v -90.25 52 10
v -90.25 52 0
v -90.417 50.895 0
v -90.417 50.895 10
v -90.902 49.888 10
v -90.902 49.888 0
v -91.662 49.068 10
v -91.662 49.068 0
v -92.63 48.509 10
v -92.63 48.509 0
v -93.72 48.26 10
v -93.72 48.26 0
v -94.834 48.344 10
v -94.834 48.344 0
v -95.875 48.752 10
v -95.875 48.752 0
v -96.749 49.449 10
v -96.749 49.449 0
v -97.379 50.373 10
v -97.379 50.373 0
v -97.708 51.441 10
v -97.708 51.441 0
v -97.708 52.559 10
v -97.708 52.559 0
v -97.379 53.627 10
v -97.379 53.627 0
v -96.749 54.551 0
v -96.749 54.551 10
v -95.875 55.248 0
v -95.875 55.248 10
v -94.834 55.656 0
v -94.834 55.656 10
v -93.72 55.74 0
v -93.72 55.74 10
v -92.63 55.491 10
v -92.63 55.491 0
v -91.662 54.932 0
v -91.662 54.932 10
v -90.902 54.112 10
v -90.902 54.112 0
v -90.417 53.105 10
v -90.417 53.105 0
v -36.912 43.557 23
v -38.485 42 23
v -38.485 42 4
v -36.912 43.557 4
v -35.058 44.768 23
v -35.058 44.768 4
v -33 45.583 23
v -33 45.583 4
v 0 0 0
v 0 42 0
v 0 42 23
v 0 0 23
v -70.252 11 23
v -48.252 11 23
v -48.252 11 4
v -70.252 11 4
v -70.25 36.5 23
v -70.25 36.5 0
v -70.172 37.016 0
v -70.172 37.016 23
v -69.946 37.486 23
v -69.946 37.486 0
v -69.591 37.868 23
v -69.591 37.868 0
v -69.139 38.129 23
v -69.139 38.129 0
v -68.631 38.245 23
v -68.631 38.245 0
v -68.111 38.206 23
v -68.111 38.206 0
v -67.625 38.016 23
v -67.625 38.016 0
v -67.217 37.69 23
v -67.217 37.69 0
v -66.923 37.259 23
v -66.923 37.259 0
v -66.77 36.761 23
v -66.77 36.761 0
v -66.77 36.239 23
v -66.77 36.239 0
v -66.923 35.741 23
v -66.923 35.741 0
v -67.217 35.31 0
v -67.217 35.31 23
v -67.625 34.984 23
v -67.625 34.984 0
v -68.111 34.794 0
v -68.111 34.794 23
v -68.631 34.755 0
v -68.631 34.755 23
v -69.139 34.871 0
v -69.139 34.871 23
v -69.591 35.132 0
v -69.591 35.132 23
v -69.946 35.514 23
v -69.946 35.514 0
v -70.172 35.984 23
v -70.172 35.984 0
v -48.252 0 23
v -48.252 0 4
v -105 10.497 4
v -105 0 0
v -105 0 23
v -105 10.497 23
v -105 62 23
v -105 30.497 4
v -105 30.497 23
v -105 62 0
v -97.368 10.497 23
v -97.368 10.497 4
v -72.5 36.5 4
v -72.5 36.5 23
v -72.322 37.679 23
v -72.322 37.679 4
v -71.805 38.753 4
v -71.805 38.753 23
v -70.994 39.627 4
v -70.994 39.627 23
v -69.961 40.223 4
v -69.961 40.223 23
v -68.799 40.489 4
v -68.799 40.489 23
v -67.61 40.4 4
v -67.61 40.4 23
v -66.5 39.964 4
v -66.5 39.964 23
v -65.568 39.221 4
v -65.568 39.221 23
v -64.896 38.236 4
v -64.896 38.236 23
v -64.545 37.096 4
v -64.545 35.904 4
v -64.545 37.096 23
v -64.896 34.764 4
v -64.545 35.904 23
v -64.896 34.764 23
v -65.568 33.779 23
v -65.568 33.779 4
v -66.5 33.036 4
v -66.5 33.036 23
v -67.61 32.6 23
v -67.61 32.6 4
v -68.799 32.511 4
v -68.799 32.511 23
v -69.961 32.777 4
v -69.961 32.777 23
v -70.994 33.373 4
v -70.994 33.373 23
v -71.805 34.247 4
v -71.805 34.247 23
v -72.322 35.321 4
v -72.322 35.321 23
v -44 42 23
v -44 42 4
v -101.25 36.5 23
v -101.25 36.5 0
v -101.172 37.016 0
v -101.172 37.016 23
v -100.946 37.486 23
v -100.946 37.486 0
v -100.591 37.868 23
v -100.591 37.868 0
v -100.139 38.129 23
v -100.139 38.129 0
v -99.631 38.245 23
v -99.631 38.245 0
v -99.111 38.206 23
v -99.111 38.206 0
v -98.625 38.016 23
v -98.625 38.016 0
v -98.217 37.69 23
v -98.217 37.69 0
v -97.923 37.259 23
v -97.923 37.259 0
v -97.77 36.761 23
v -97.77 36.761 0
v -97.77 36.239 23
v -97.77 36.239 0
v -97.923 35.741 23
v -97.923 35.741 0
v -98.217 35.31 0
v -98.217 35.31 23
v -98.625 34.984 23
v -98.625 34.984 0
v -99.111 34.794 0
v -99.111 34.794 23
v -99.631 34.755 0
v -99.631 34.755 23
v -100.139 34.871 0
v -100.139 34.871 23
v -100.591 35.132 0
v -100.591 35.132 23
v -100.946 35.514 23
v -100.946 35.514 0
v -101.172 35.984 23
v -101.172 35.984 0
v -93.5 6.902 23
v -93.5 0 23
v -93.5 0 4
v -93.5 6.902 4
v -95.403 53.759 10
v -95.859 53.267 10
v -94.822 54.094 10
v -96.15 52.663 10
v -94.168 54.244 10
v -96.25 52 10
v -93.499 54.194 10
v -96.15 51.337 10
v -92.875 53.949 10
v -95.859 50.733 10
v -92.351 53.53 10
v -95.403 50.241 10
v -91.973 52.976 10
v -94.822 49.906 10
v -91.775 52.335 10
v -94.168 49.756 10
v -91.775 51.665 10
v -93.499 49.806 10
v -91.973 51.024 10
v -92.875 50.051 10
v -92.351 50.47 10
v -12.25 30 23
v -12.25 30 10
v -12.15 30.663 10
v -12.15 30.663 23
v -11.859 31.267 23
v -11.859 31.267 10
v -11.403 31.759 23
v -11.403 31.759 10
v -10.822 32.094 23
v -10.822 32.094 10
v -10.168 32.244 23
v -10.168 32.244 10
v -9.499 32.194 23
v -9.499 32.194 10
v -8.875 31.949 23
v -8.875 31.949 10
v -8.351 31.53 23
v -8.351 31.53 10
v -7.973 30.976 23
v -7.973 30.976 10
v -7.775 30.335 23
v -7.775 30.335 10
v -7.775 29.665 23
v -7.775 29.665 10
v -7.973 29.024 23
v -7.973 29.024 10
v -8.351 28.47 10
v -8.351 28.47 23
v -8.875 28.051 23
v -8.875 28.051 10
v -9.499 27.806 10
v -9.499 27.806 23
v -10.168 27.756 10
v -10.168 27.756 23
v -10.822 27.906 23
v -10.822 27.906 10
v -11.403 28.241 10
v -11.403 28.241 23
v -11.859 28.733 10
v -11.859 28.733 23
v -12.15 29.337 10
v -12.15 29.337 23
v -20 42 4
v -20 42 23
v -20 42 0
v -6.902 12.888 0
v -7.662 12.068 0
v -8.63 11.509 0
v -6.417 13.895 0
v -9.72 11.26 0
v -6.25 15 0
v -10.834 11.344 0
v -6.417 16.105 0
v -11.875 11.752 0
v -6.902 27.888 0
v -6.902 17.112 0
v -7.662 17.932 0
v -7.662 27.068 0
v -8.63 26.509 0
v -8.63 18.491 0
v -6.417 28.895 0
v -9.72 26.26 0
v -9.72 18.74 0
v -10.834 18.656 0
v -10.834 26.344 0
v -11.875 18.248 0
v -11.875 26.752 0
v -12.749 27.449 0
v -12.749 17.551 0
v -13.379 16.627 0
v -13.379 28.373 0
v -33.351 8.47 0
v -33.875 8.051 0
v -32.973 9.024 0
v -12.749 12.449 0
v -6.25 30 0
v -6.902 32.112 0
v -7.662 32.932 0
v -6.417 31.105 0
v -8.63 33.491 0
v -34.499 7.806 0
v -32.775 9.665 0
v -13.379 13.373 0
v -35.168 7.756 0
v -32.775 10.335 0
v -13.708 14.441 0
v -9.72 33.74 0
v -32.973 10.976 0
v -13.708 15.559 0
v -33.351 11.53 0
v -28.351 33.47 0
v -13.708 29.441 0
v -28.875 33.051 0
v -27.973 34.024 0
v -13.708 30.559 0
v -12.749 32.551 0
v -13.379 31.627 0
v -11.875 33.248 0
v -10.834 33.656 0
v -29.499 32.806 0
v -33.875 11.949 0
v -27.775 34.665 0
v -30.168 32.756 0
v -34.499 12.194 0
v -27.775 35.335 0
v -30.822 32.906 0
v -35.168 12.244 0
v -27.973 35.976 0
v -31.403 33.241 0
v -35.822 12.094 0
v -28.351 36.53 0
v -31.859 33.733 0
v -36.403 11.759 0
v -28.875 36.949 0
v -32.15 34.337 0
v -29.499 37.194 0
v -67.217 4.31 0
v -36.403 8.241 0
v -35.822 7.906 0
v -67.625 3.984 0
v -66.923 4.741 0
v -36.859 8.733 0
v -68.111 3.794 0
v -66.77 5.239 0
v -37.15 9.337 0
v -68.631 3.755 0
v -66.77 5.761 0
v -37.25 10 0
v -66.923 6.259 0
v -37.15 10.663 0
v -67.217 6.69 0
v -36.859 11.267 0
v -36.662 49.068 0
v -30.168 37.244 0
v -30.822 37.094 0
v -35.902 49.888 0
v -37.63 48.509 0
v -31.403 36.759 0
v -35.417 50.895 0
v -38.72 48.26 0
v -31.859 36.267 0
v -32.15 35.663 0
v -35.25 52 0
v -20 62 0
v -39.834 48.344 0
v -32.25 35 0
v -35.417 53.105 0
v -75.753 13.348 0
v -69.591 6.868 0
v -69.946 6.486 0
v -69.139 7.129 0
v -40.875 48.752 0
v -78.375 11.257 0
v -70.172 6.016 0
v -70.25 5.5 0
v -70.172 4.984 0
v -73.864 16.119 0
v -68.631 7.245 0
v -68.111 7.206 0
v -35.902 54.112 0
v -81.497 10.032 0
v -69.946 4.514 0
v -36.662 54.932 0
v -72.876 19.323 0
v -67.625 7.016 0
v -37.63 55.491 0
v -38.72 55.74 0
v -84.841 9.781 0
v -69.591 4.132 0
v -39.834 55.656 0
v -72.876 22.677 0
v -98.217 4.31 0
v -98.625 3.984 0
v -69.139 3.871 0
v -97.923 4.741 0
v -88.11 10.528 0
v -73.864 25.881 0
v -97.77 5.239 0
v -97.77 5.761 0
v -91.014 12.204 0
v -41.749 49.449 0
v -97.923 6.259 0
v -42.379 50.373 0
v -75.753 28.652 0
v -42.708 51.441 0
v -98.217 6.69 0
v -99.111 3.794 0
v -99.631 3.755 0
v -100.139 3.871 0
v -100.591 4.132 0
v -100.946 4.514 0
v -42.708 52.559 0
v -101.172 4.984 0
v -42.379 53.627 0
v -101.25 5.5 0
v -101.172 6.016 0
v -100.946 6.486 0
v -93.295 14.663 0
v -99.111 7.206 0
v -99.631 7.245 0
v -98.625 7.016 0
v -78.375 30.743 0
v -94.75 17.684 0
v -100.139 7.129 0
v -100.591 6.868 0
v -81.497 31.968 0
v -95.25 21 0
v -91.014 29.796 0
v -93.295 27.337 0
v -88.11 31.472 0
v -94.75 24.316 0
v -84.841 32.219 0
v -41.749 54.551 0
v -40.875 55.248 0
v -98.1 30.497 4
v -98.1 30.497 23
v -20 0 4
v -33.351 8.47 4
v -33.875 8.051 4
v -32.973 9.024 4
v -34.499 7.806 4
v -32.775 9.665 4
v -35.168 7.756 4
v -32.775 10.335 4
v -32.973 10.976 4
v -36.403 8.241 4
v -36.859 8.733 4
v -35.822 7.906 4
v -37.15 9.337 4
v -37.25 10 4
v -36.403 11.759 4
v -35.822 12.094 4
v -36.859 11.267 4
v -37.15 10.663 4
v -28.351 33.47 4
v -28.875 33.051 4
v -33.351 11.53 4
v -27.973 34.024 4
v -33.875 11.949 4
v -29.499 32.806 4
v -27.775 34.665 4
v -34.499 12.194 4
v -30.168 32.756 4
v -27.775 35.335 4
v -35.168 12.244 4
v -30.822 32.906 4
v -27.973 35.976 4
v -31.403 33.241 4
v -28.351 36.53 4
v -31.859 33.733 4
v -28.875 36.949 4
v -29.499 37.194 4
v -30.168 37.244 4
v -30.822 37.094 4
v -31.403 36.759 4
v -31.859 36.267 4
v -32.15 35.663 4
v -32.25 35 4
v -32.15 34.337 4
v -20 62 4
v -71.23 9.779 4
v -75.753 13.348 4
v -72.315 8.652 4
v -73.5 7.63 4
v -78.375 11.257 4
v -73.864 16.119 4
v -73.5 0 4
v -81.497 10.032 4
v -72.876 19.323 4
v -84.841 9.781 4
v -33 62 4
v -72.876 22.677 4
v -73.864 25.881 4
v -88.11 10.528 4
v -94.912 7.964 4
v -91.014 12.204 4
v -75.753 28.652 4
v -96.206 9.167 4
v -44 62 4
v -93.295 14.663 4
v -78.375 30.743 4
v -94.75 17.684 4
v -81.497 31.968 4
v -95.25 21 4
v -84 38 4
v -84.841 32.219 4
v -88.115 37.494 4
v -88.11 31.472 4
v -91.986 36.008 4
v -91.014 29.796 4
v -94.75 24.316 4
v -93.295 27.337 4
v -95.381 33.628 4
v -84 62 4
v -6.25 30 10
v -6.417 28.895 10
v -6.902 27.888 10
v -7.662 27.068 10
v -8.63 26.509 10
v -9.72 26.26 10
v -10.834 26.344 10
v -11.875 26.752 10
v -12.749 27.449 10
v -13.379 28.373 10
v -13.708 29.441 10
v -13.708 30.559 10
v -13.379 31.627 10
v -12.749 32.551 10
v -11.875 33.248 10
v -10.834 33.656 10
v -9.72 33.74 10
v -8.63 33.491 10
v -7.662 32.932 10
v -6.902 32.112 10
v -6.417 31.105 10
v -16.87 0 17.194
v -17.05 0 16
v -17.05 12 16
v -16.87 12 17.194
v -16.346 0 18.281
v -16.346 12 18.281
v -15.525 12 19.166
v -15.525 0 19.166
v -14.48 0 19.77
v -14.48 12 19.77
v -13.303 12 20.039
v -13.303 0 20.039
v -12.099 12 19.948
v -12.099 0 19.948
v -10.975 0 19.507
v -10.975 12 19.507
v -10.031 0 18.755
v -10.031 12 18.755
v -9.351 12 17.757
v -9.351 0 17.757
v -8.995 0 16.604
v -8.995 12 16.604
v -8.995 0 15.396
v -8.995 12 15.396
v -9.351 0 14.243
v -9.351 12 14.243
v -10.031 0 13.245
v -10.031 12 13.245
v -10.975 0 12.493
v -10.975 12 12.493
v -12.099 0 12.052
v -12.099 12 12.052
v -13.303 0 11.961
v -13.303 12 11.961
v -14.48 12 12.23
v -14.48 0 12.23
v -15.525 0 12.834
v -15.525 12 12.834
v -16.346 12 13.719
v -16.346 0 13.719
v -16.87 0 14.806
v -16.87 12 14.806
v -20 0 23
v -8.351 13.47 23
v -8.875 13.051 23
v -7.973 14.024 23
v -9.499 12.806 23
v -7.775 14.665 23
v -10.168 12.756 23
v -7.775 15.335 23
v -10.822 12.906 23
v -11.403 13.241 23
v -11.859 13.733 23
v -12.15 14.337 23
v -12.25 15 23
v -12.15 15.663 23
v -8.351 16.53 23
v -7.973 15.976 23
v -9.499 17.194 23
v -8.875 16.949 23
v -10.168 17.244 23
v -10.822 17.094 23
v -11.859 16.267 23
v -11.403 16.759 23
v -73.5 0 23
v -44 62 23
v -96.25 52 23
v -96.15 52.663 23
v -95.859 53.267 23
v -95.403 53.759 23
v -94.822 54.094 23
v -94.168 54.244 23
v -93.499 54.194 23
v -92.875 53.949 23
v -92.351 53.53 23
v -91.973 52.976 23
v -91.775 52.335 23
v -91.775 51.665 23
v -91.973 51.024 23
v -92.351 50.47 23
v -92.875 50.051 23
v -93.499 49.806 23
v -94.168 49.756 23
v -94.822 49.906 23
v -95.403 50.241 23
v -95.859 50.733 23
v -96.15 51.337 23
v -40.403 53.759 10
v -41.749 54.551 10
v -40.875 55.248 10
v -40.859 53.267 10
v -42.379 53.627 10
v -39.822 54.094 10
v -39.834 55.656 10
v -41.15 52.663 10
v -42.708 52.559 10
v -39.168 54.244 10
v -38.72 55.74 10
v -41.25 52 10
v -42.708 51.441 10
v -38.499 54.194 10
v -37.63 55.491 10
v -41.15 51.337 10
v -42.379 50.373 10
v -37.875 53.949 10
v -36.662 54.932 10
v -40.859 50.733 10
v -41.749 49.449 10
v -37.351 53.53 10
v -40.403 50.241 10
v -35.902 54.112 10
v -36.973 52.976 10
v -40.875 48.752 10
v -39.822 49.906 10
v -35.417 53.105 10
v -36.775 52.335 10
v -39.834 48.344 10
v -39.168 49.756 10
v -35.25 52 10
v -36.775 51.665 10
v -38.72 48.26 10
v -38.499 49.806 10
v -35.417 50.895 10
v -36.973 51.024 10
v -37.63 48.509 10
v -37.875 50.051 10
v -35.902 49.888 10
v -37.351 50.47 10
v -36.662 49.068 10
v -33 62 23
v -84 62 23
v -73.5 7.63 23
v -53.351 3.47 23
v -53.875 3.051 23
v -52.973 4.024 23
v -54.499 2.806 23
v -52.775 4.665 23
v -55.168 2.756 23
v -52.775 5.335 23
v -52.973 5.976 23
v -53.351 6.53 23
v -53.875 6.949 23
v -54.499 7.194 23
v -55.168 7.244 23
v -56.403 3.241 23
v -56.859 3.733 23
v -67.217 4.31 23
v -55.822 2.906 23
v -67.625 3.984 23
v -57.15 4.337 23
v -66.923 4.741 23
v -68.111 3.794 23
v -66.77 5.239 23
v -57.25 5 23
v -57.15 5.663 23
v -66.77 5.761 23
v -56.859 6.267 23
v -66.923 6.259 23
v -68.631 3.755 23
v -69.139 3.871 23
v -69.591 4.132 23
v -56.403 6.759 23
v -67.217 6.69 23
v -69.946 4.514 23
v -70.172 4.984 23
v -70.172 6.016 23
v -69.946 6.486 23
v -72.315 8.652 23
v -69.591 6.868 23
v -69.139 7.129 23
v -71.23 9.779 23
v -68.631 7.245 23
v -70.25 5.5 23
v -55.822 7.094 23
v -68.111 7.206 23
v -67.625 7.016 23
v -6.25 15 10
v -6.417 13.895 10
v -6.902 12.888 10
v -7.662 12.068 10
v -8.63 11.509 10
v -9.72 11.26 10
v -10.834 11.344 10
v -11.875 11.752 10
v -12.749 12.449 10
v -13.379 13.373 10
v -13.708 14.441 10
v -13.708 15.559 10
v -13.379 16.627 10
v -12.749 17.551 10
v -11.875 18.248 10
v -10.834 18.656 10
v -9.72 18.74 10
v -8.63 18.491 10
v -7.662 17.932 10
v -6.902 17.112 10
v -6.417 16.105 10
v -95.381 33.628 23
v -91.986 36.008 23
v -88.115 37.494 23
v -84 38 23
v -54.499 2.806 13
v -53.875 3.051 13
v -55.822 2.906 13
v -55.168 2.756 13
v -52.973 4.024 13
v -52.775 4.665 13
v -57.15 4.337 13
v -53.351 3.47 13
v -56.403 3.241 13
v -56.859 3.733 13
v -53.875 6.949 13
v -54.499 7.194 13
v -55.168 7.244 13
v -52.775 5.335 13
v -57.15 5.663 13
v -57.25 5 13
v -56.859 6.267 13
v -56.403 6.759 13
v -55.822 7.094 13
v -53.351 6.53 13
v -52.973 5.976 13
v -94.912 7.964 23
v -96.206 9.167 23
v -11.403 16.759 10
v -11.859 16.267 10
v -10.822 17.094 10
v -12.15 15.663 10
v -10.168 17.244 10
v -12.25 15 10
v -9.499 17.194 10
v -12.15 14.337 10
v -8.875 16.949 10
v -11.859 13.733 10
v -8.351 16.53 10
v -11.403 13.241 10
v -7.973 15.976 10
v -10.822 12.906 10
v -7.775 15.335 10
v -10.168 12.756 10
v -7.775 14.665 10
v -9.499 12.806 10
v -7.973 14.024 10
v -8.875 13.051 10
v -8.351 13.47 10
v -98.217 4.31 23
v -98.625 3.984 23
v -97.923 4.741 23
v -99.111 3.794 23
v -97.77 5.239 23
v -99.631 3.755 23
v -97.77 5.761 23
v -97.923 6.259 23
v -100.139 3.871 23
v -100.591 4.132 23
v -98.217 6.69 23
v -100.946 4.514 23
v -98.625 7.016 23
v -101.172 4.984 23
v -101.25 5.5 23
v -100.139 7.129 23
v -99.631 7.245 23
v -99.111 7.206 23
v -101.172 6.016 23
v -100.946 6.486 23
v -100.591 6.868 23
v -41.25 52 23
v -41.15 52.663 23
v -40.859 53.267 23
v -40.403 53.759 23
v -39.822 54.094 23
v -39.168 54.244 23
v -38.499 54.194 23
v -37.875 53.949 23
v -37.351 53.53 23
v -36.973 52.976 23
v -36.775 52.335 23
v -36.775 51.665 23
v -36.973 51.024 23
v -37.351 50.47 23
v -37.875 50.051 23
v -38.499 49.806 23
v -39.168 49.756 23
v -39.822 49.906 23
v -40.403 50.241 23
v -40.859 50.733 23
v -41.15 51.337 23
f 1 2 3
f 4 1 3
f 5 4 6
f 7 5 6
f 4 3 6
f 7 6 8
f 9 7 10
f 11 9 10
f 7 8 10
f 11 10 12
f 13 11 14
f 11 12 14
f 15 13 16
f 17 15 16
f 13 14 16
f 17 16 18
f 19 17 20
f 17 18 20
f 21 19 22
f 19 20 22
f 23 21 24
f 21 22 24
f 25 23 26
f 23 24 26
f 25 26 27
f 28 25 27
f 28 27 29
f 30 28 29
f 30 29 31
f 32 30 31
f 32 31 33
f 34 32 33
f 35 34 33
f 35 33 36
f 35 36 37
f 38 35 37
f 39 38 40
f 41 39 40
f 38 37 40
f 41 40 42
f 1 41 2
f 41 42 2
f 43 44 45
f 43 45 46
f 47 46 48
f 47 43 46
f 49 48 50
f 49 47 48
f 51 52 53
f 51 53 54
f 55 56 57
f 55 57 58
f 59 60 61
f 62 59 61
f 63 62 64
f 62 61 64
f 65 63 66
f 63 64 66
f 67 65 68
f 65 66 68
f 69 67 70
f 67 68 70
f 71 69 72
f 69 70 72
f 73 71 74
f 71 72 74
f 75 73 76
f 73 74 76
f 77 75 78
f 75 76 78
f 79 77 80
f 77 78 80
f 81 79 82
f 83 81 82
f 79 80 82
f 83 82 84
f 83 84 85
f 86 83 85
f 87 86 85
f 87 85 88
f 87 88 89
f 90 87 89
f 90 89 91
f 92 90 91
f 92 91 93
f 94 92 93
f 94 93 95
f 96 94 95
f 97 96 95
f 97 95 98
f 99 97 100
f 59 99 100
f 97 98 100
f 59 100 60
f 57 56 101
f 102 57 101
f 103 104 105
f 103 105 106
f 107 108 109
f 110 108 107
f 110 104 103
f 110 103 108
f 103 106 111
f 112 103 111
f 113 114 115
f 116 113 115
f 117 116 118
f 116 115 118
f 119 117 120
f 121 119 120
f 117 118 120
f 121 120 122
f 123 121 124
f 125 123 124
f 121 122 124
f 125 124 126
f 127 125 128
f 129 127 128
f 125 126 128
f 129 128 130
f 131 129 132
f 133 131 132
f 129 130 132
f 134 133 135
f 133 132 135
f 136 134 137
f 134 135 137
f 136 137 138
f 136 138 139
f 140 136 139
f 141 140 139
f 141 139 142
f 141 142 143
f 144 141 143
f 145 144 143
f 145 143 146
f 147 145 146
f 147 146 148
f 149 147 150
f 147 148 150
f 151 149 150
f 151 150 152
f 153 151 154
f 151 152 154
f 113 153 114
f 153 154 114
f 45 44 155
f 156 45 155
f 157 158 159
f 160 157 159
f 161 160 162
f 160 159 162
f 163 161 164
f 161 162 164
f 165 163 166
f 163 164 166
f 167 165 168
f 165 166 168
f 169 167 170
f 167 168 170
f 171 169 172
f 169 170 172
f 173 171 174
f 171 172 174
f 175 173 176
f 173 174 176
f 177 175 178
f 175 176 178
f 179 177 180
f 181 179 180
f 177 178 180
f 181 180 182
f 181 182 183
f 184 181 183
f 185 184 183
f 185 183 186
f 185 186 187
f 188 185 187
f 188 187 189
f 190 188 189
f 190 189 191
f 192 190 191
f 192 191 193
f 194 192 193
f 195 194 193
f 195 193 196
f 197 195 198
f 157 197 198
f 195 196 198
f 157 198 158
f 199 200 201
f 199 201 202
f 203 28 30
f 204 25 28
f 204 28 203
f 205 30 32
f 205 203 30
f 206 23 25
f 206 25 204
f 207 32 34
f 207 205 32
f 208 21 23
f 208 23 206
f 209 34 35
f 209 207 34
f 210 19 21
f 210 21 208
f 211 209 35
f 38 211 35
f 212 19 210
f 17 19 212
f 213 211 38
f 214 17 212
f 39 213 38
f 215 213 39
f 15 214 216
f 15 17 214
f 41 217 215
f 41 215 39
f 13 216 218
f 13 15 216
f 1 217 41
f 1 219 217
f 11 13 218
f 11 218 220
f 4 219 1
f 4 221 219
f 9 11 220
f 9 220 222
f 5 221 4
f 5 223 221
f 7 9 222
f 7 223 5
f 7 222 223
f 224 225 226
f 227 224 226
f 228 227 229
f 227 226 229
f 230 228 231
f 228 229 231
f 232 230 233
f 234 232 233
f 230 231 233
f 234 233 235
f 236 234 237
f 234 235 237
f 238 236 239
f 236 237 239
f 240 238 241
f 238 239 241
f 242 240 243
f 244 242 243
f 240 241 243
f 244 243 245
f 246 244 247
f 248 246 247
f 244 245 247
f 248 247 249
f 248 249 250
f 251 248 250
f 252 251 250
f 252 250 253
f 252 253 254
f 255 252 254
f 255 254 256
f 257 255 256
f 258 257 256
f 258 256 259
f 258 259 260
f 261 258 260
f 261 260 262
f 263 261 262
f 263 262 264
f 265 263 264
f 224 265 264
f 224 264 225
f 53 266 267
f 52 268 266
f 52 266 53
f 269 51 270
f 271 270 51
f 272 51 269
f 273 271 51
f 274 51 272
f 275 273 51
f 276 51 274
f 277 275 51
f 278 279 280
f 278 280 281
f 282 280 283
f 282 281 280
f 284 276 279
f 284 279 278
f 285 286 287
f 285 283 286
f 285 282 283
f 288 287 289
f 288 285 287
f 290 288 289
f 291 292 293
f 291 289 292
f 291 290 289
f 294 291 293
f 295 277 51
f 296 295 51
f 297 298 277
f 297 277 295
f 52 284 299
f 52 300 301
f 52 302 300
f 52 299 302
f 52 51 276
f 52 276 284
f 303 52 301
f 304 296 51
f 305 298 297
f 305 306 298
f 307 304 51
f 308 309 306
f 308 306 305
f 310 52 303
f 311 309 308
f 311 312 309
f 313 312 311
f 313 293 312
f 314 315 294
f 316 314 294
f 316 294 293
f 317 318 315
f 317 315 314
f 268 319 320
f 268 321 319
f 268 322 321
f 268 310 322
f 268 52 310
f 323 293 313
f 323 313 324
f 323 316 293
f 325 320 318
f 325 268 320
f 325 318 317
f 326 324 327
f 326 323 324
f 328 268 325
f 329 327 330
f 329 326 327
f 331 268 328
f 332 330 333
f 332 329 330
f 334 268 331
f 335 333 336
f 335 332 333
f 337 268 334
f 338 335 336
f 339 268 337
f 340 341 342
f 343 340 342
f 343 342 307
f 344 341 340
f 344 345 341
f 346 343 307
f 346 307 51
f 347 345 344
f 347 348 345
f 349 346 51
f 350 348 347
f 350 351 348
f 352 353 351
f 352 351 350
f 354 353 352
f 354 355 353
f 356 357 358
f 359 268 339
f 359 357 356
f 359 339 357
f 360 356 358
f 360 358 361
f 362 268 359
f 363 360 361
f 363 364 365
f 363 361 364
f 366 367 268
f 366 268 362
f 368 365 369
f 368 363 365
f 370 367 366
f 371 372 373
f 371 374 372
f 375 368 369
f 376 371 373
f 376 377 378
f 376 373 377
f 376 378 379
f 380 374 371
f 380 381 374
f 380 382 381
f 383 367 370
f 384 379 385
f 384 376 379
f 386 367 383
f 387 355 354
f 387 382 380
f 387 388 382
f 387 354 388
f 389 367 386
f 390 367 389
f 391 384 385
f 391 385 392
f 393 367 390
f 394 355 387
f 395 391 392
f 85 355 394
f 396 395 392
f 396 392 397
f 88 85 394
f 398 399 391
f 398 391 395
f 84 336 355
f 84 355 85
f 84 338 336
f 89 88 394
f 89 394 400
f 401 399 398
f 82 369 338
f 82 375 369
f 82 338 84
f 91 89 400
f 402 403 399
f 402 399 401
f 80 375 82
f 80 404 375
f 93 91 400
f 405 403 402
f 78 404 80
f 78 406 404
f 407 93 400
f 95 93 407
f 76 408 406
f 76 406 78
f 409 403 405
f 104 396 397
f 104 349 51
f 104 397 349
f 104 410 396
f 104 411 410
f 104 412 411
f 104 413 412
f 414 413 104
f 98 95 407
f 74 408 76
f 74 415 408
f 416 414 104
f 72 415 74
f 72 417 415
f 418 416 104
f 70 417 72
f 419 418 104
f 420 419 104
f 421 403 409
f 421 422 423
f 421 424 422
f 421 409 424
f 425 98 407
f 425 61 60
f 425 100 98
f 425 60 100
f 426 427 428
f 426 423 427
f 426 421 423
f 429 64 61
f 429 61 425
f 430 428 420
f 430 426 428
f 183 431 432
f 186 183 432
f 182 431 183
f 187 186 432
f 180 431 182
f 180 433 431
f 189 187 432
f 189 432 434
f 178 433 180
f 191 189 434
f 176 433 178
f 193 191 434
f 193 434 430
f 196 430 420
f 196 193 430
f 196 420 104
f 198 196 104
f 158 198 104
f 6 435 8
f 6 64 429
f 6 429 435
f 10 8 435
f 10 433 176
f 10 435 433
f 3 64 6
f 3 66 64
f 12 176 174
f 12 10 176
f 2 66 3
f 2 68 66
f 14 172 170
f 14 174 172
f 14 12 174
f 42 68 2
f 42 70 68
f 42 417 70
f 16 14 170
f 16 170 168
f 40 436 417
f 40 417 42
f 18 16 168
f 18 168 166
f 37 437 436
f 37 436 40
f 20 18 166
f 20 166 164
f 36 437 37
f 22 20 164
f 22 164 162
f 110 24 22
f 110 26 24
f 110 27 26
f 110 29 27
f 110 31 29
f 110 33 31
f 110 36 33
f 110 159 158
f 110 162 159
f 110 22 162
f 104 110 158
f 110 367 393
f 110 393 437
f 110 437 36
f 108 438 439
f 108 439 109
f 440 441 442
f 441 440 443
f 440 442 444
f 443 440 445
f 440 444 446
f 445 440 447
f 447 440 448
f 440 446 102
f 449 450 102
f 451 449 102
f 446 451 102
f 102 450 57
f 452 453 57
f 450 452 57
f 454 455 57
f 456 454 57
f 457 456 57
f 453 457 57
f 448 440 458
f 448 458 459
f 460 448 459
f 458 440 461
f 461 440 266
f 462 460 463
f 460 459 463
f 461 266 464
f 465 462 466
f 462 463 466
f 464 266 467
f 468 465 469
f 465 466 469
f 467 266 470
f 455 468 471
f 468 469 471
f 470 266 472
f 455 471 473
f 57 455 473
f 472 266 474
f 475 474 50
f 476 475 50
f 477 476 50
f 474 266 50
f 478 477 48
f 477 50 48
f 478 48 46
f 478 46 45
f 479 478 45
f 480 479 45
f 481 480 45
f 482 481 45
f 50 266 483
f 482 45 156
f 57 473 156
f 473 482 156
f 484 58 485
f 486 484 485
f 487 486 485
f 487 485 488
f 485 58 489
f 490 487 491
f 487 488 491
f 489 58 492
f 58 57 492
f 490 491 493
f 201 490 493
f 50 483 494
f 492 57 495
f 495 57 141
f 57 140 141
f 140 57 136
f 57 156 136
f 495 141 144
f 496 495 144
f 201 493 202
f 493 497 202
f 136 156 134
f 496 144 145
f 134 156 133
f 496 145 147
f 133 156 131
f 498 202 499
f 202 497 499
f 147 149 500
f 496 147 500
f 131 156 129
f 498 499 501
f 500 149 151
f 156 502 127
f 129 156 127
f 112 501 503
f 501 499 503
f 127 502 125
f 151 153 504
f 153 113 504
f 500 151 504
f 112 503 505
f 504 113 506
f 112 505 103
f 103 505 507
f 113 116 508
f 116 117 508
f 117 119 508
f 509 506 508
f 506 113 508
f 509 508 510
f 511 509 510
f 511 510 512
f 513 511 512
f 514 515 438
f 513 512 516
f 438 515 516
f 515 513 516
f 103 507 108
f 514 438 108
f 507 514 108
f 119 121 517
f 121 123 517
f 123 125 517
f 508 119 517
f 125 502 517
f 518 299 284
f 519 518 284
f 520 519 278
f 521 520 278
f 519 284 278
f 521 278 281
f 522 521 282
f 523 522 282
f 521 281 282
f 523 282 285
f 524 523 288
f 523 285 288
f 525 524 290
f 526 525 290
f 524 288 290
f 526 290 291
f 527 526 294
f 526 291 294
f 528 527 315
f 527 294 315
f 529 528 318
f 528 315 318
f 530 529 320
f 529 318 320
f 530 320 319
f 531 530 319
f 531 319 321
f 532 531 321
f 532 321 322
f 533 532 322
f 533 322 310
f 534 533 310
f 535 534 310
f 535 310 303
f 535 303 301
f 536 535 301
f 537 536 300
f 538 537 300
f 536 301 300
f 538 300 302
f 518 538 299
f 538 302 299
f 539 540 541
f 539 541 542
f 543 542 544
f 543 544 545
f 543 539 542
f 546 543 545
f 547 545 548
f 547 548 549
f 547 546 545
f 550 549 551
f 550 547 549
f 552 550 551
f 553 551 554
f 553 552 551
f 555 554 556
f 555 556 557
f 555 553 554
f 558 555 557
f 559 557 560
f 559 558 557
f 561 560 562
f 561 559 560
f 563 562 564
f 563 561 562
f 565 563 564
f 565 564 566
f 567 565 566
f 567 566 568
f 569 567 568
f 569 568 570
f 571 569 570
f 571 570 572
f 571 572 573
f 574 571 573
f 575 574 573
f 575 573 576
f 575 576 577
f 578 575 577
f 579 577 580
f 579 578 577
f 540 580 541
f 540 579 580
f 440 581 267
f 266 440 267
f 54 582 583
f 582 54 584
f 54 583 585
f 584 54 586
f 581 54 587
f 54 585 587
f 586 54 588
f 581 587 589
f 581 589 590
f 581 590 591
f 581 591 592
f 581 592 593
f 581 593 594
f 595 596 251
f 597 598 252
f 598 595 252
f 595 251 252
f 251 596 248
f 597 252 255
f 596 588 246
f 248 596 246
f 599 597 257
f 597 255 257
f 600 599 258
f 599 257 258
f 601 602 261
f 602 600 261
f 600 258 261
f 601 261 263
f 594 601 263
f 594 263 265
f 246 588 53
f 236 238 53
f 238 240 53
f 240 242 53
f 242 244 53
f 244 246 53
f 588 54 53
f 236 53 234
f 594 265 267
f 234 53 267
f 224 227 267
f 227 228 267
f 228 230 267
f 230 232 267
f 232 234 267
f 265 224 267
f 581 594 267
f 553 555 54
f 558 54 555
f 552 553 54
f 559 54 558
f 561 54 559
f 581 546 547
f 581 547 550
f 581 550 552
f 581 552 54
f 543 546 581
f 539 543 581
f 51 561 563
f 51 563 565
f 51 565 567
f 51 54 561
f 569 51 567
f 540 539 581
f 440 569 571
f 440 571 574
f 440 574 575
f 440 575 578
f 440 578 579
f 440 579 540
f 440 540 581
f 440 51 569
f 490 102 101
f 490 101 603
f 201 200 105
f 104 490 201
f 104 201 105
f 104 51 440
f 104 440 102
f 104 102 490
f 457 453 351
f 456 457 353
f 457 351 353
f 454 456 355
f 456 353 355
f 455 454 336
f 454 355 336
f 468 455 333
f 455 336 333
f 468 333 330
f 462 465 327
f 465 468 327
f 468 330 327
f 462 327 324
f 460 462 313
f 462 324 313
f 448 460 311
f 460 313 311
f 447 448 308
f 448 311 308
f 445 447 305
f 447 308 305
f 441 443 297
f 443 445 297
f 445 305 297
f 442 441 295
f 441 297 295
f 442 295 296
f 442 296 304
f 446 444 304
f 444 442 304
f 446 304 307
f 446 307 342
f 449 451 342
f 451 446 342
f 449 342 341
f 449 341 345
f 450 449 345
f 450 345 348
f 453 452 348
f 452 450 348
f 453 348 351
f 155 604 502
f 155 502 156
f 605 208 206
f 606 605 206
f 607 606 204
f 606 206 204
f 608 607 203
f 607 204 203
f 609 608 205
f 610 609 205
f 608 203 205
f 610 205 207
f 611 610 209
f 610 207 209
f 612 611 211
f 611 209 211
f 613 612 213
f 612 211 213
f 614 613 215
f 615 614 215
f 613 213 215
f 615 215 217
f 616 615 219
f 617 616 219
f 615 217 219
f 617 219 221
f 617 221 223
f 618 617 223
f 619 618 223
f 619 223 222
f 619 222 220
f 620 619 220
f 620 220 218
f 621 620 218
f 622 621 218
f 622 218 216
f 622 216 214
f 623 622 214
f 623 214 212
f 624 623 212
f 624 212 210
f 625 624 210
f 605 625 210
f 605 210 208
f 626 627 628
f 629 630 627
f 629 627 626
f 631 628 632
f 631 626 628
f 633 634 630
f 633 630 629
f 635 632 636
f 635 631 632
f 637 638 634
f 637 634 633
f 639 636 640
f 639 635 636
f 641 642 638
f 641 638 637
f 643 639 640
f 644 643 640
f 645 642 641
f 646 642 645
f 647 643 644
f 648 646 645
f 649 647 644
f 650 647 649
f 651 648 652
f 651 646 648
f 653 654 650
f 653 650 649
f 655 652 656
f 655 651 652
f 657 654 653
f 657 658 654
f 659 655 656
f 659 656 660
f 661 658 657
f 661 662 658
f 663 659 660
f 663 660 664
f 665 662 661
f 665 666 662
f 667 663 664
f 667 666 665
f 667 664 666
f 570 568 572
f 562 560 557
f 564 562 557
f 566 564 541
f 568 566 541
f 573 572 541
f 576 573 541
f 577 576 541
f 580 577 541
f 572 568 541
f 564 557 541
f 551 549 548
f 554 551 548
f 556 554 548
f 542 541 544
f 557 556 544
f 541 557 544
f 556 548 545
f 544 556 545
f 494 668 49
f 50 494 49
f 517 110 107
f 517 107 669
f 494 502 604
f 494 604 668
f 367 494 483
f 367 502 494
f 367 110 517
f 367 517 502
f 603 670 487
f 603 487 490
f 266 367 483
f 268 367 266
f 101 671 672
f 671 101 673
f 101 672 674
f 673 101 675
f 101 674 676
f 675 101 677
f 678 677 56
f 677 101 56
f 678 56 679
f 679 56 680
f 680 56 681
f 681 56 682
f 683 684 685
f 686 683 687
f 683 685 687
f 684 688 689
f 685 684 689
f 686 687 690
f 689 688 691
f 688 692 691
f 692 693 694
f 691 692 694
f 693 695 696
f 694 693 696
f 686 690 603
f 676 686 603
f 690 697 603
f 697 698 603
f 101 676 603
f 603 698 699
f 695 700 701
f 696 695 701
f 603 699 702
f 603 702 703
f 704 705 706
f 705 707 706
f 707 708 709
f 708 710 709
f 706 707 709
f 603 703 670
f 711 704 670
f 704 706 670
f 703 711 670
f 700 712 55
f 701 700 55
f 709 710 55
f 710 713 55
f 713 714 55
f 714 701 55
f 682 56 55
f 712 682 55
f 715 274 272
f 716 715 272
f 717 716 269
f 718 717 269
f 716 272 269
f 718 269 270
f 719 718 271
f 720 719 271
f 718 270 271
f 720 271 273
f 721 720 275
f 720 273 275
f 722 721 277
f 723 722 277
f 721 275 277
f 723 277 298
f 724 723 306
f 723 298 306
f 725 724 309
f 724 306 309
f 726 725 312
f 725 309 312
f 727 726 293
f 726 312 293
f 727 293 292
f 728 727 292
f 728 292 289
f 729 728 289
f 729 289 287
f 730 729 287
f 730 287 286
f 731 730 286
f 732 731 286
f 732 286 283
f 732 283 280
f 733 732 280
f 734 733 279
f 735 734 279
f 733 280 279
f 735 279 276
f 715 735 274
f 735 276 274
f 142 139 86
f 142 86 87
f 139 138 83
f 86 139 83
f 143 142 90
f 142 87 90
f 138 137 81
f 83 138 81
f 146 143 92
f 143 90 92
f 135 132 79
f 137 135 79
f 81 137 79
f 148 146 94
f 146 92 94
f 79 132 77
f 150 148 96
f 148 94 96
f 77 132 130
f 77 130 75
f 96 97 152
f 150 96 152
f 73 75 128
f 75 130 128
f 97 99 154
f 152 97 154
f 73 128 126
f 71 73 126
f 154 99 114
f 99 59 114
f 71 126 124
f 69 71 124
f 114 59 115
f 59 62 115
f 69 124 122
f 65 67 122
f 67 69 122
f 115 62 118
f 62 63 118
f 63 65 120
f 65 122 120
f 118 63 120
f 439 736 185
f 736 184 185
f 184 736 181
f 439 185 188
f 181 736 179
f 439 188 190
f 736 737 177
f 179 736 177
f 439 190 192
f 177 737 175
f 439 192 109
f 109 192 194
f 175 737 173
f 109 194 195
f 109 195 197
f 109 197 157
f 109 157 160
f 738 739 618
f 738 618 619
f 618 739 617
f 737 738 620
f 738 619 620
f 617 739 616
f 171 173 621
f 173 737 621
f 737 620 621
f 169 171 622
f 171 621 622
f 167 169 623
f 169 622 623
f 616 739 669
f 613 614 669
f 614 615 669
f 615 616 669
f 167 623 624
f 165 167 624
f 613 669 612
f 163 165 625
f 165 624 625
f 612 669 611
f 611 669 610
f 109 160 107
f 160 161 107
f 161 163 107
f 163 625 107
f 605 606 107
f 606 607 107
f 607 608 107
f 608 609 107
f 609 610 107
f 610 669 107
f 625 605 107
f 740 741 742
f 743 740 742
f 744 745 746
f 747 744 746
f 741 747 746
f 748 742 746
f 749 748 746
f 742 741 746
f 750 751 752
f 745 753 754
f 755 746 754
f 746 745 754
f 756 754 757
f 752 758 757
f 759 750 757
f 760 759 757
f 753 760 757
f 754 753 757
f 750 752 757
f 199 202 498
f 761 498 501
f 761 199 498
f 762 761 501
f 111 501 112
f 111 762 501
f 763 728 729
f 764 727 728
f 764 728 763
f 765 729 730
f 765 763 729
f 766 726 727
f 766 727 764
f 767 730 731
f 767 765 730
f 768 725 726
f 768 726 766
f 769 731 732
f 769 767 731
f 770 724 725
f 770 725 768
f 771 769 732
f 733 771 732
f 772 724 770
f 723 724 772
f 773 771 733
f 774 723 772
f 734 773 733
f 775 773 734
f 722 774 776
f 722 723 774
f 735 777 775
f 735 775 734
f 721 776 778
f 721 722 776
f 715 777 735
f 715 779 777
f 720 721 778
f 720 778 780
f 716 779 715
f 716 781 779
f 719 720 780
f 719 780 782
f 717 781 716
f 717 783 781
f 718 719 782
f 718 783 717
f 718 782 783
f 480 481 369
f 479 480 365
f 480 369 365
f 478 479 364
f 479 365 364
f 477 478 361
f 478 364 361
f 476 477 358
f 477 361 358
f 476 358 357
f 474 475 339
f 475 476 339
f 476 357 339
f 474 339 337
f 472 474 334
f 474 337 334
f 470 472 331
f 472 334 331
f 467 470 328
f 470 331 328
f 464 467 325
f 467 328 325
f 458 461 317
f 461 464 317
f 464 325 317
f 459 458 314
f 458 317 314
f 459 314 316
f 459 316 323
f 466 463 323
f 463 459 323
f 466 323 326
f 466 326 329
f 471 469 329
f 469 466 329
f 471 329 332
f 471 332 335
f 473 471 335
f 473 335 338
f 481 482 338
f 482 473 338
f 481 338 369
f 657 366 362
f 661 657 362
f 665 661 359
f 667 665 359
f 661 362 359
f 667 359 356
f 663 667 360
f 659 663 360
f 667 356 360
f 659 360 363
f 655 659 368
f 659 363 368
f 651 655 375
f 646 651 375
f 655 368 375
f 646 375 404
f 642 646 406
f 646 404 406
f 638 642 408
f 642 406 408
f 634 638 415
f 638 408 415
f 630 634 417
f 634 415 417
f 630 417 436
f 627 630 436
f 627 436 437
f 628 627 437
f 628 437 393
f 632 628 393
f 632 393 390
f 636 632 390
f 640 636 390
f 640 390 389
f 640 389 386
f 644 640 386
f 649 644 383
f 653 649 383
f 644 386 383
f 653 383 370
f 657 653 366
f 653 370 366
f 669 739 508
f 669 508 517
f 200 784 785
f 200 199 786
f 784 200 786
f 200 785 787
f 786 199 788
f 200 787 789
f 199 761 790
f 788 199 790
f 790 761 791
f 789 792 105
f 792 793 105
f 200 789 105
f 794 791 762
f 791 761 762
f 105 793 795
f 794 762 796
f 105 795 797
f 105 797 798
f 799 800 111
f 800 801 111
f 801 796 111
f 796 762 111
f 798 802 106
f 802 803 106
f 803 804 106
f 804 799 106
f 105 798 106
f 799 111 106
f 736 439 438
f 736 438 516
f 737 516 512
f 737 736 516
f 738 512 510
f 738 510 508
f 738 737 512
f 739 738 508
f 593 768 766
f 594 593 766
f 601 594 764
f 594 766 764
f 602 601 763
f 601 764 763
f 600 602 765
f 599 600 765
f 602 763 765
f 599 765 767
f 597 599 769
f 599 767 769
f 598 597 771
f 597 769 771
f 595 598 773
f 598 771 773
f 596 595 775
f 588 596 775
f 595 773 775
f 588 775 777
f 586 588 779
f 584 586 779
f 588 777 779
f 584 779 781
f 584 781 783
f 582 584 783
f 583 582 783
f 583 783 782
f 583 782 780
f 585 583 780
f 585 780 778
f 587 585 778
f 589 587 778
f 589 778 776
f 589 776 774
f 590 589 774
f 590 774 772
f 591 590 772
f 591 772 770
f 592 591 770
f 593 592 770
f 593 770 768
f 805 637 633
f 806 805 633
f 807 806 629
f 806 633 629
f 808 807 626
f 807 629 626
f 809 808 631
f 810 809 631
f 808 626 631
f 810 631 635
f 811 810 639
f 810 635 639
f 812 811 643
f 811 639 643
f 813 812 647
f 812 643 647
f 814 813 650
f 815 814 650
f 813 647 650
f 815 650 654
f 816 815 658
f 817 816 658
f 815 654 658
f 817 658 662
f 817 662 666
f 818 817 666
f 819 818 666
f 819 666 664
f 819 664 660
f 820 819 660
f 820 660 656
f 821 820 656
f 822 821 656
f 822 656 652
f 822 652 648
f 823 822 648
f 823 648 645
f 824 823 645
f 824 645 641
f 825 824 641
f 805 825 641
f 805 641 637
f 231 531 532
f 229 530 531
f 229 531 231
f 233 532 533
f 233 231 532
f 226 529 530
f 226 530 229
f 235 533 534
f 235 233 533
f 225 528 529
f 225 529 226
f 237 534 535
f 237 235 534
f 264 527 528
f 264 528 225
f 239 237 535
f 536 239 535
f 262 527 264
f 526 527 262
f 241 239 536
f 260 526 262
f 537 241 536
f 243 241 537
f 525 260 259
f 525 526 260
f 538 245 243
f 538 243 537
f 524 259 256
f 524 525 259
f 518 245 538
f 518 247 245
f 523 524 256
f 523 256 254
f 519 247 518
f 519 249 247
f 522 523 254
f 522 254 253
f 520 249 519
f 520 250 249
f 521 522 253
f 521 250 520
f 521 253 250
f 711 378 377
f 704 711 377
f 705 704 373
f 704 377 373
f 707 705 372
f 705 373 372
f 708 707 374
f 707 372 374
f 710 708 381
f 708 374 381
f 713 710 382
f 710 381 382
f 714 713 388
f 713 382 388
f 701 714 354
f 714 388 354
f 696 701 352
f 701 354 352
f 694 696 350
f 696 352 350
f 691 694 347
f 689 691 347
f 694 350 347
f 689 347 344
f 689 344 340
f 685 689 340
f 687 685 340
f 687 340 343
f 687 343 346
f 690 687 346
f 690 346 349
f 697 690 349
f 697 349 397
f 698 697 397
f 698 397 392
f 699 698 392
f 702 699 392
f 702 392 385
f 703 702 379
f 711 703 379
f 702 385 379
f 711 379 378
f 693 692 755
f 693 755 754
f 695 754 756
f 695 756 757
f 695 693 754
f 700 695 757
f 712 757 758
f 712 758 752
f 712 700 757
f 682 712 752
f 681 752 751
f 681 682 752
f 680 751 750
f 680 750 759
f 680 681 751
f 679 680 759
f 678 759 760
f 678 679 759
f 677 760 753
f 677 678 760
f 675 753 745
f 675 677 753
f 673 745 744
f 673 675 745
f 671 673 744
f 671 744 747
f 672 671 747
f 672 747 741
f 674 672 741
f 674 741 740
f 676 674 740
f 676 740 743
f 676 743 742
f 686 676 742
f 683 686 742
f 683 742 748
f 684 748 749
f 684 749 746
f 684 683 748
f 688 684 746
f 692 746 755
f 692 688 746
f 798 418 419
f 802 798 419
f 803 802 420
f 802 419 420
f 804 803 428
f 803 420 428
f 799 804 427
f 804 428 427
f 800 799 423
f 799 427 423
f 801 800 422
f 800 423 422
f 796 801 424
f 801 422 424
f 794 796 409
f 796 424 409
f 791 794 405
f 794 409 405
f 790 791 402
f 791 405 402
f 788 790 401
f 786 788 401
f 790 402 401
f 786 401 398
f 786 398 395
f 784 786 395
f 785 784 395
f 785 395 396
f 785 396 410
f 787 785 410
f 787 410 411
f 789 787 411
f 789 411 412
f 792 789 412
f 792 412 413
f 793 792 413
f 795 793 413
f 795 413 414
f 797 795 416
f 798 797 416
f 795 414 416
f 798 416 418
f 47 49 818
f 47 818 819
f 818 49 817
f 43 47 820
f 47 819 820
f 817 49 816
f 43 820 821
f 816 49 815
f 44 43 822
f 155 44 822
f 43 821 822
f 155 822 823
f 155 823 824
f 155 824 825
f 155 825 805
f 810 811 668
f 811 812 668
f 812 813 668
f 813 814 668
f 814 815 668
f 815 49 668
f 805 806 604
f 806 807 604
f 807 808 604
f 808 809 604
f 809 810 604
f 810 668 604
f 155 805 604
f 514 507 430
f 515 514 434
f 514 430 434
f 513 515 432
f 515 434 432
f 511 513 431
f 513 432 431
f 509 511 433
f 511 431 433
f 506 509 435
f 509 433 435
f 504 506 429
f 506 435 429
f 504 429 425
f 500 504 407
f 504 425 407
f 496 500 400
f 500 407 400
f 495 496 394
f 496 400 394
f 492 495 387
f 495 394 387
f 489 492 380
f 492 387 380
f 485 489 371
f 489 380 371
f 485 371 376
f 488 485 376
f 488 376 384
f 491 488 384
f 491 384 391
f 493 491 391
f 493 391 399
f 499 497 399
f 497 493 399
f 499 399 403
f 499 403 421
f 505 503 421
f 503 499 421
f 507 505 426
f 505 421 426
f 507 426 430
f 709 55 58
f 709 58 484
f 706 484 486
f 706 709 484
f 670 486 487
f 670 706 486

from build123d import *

# Parameters (mm, degrees)
SKETCH_R        = 2.25
SKETCH_R_2      = 11.25
SKETCH_R_3      = 1.75
PAD_DEPTH       = 23
SKETCH001_R     = 4
POCKET_DEPTH    = 19
SKETCH002_R     = 2.25
POCKET001_DEPTH = 10
SKETCH003_R     = 4.05
POCKET002_DEPTH = 12
SKETCH004_R     = 3.75
POCKET003_DEPTH = 10


with BuildPart() as pocket002:
    # Sketch → Pad (new body)
    with BuildSketch(Plane.XY):
        Polygon((0, 0), (105, 0), (105, 62), (20, 62), (20, 42), (0, 42), align=None)
        with Locations((35, 10)):
            Circle(SKETCH_R, mode=Mode.SUBTRACT)
        with Locations((30, 35)):
            Circle(SKETCH_R, mode=Mode.SUBTRACT)
        with Locations((84, 21)):
            Circle(SKETCH_R_2, mode=Mode.SUBTRACT)
        with Locations((68.5, 36.5)):
            Circle(SKETCH_R_3, mode=Mode.SUBTRACT)
        with Locations((99.5, 36.5)):
            Circle(SKETCH_R_3, mode=Mode.SUBTRACT)
        with Locations((68.5, 5.5)):
            Circle(SKETCH_R_3, mode=Mode.SUBTRACT)
        with Locations((99.5, 5.5)):
            Circle(SKETCH_R_3, mode=Mode.SUBTRACT)
        with Locations((10, 30)):
            Circle(SKETCH_R, mode=Mode.SUBTRACT)
        with Locations((10, 15)):
            Circle(SKETCH_R, mode=Mode.SUBTRACT)
        with Locations((39, 52)):
            Circle(SKETCH_R, mode=Mode.SUBTRACT)
        with Locations((94, 52)):
            Circle(SKETCH_R, mode=Mode.SUBTRACT)
    extrude(amount=PAD_DEPTH)

    # Sketch001 → Pocket (cut)
    with BuildSketch(Plane.XY.offset(23)):
        with BuildLine():
            ThreePointArc((38.485281, 42), (36.015595, 44.209377), (32.999996, 45.583006))
            Line((32.999996, 67), (32.999996, 45.583006))
            Line((20, 67), (32.999996, 67))
            Line((20, -1), (20, 67))
            Line((20, -1), (48.252269, -1))
            Line((48.252269, 11), (48.252269, -1))
            Line((48.252269, 11), (70.252269, 11))
            ThreePointArc((70.252269, 11), (71.759618, 9.202833), (73.499996, 7.630258))
            Line((73.499996, 7.630258), (73.499996, -1))
            Line((73.499996, -1), (93.499996, -1))
            Line((93.499996, -1), (93.499996, 6.902128))
            ThreePointArc((93.499996, 6.902128), (95.574295, 8.548671), (97.367695, 10.497399))
            Line((105.499996, 10.497399), (97.367695, 10.497399))
            Line((105.499996, 30.497399), (105.499996, 10.497399))
            Line((98.099621, 30.497399), (105.499996, 30.497399))
            ThreePointArc((98.099621, 30.497399), (91.98574, 36.007594), (83.999996, 38))
            Line((83.999996, 38), (83.999996, 67))
            Line((83.999996, 67), (43.999996, 67))
            Line((43.999996, 67), (43.999996, 42))
            Line((38.485281, 42), (43.999996, 42))
        make_face()
        with Locations((68.5, 36.5)):
            Circle(SKETCH001_R, mode=Mode.SUBTRACT)
    extrude(amount=-POCKET_DEPTH, mode=Mode.SUBTRACT)

    # Sketch002 → Pocket001 (cut)
    with BuildSketch(Plane.XY.offset(23)):
        with Locations((55, 5)):
            Circle(SKETCH002_R)
    extrude(amount=-POCKET001_DEPTH, mode=Mode.SUBTRACT)

    # Sketch003 → Pocket002 (cut)
    with BuildSketch(Plane.XZ):
        with Locations((13, 16)):
            Circle(SKETCH003_R)
    extrude(amount=-POCKET002_DEPTH, mode=Mode.SUBTRACT)


with BuildPart() as pocket003:
    # Part__Mirroring: instance of Pocket002
    add(pocket002.part.mirror(Plane(origin=(0, 0, 0), x_dir=(0, -1, 0), z_dir=(1, 0, 0))))

    # Sketch004 → Pocket003 (cut)
    with BuildSketch(Plane(origin=(0, 0, 0), x_dir=(1, 0, 0), z_dir=(0, 0, -1))):
        with Locations((-10, -15)):
            Circle(SKETCH004_R)
        with Locations((-10, -30)):
            Circle(SKETCH004_R)
        with Locations((-94, -52)):
            Circle(SKETCH004_R)
        with Locations((-39, -52)):
            Circle(SKETCH004_R)
    extrude(amount=-POCKET003_DEPTH, mode=Mode.SUBTRACT)


solid = pocket003.part
